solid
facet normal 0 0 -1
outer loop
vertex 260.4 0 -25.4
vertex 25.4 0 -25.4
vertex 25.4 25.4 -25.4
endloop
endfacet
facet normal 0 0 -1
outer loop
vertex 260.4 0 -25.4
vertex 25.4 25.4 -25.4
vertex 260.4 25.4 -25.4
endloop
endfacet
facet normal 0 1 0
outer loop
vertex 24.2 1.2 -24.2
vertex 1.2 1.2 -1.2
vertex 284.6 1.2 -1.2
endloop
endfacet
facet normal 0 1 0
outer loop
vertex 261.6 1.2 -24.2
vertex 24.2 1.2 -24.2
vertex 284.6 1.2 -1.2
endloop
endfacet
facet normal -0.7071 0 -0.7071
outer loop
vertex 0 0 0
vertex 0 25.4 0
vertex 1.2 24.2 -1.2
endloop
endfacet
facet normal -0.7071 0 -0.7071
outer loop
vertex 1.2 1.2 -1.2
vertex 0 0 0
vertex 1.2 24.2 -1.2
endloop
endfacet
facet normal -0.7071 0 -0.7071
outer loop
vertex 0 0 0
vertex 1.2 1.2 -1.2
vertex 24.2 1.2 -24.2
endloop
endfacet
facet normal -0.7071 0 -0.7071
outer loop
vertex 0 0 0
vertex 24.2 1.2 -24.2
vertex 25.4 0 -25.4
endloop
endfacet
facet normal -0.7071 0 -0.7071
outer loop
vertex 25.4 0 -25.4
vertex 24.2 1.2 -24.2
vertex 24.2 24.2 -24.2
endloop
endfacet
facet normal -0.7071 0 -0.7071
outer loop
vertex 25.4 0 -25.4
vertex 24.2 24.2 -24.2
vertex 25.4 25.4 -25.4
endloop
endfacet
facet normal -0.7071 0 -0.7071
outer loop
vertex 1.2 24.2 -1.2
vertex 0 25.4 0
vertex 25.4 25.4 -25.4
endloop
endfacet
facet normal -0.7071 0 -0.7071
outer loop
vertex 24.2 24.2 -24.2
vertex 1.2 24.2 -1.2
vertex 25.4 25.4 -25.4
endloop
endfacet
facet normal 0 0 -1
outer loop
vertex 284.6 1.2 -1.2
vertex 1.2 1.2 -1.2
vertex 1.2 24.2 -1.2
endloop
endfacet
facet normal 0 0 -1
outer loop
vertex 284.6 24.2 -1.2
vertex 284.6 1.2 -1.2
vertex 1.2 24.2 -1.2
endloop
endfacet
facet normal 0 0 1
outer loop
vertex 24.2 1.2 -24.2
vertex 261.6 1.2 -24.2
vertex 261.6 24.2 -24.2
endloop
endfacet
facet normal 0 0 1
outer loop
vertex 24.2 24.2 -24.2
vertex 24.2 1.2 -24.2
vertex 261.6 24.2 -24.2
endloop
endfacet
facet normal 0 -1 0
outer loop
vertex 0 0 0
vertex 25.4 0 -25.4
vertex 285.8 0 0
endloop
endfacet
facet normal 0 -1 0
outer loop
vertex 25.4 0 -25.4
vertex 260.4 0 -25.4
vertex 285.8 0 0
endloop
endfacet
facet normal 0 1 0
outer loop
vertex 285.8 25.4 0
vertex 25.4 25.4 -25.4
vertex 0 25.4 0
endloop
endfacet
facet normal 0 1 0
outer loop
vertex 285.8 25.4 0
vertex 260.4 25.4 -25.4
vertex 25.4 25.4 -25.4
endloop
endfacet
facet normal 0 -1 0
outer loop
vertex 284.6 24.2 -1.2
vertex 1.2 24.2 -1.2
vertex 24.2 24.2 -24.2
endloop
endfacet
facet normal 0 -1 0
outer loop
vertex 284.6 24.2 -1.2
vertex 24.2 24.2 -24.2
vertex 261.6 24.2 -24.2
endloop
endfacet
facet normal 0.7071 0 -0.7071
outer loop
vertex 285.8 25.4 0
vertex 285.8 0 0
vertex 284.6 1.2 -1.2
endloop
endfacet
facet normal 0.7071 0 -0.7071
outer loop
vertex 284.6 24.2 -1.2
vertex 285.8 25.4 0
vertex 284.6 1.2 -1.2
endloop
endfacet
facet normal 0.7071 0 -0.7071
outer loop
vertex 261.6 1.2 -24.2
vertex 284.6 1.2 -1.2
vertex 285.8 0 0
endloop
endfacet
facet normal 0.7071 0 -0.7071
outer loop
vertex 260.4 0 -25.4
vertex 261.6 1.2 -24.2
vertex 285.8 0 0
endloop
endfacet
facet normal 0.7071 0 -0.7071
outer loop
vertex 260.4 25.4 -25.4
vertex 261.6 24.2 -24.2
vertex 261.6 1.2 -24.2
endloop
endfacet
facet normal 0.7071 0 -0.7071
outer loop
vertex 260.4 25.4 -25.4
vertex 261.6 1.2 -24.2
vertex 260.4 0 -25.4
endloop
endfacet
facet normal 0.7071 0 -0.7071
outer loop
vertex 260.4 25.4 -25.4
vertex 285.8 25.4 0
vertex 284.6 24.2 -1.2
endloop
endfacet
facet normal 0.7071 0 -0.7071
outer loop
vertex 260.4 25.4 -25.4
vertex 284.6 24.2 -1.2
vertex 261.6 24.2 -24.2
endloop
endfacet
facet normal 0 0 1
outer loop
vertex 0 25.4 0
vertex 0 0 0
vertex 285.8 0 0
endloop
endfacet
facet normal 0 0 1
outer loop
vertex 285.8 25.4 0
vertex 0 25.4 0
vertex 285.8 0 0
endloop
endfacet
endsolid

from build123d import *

# Parameters (mm, degrees)
SKETCH1_W           = 285.8
SKETCH1_H           = 25.4
BOSS_EXTRUDE1_DEPTH = 25.4
SKETCH2_W           = 23
SKETCH2_H           = 23
CUT_EXTRUDE1_DEPTH  = 450
CUT_EXTRUDE2_DEPTH  = 25.4


with BuildPart() as part:
    # Sketch1 → Boss-Extrude1 (new body)
    with BuildSketch(Plane(origin=(0, 0, 0), x_dir=(1, 0, 0), z_dir=(0, 1, 0))):
        with Locations((142.9, 12.7)):
            Rectangle(SKETCH1_W, SKETCH1_H)
    extrude(amount=BOSS_EXTRUDE1_DEPTH)

    # Sketch2 → Cut-Extrude1 (cut)
    with BuildSketch(Plane(origin=(285.8, 0, 0), x_dir=(0, 0, -1), z_dir=(1, 0, 0))):
        with Locations((12.7, 12.7)):
            Rectangle(SKETCH2_W, SKETCH2_H)
    extrude(amount=-CUT_EXTRUDE1_DEPTH, mode=Mode.SUBTRACT)

    # Sketch3 → Cut-Extrude2 (cut)
    with BuildSketch(Plane(origin=(0, 25.4, 0), x_dir=(1, 0, 0), z_dir=(0, 1, 0))):
        Polygon((0, 0), (25.4, 25.4), (0, 25.4), align=None)
        Polygon((285.8, 0), (260.4, 25.4), (285.8, 25.4), align=None)
    extrude(amount=-CUT_EXTRUDE2_DEPTH, mode=Mode.SUBTRACT)


solid = part.part
